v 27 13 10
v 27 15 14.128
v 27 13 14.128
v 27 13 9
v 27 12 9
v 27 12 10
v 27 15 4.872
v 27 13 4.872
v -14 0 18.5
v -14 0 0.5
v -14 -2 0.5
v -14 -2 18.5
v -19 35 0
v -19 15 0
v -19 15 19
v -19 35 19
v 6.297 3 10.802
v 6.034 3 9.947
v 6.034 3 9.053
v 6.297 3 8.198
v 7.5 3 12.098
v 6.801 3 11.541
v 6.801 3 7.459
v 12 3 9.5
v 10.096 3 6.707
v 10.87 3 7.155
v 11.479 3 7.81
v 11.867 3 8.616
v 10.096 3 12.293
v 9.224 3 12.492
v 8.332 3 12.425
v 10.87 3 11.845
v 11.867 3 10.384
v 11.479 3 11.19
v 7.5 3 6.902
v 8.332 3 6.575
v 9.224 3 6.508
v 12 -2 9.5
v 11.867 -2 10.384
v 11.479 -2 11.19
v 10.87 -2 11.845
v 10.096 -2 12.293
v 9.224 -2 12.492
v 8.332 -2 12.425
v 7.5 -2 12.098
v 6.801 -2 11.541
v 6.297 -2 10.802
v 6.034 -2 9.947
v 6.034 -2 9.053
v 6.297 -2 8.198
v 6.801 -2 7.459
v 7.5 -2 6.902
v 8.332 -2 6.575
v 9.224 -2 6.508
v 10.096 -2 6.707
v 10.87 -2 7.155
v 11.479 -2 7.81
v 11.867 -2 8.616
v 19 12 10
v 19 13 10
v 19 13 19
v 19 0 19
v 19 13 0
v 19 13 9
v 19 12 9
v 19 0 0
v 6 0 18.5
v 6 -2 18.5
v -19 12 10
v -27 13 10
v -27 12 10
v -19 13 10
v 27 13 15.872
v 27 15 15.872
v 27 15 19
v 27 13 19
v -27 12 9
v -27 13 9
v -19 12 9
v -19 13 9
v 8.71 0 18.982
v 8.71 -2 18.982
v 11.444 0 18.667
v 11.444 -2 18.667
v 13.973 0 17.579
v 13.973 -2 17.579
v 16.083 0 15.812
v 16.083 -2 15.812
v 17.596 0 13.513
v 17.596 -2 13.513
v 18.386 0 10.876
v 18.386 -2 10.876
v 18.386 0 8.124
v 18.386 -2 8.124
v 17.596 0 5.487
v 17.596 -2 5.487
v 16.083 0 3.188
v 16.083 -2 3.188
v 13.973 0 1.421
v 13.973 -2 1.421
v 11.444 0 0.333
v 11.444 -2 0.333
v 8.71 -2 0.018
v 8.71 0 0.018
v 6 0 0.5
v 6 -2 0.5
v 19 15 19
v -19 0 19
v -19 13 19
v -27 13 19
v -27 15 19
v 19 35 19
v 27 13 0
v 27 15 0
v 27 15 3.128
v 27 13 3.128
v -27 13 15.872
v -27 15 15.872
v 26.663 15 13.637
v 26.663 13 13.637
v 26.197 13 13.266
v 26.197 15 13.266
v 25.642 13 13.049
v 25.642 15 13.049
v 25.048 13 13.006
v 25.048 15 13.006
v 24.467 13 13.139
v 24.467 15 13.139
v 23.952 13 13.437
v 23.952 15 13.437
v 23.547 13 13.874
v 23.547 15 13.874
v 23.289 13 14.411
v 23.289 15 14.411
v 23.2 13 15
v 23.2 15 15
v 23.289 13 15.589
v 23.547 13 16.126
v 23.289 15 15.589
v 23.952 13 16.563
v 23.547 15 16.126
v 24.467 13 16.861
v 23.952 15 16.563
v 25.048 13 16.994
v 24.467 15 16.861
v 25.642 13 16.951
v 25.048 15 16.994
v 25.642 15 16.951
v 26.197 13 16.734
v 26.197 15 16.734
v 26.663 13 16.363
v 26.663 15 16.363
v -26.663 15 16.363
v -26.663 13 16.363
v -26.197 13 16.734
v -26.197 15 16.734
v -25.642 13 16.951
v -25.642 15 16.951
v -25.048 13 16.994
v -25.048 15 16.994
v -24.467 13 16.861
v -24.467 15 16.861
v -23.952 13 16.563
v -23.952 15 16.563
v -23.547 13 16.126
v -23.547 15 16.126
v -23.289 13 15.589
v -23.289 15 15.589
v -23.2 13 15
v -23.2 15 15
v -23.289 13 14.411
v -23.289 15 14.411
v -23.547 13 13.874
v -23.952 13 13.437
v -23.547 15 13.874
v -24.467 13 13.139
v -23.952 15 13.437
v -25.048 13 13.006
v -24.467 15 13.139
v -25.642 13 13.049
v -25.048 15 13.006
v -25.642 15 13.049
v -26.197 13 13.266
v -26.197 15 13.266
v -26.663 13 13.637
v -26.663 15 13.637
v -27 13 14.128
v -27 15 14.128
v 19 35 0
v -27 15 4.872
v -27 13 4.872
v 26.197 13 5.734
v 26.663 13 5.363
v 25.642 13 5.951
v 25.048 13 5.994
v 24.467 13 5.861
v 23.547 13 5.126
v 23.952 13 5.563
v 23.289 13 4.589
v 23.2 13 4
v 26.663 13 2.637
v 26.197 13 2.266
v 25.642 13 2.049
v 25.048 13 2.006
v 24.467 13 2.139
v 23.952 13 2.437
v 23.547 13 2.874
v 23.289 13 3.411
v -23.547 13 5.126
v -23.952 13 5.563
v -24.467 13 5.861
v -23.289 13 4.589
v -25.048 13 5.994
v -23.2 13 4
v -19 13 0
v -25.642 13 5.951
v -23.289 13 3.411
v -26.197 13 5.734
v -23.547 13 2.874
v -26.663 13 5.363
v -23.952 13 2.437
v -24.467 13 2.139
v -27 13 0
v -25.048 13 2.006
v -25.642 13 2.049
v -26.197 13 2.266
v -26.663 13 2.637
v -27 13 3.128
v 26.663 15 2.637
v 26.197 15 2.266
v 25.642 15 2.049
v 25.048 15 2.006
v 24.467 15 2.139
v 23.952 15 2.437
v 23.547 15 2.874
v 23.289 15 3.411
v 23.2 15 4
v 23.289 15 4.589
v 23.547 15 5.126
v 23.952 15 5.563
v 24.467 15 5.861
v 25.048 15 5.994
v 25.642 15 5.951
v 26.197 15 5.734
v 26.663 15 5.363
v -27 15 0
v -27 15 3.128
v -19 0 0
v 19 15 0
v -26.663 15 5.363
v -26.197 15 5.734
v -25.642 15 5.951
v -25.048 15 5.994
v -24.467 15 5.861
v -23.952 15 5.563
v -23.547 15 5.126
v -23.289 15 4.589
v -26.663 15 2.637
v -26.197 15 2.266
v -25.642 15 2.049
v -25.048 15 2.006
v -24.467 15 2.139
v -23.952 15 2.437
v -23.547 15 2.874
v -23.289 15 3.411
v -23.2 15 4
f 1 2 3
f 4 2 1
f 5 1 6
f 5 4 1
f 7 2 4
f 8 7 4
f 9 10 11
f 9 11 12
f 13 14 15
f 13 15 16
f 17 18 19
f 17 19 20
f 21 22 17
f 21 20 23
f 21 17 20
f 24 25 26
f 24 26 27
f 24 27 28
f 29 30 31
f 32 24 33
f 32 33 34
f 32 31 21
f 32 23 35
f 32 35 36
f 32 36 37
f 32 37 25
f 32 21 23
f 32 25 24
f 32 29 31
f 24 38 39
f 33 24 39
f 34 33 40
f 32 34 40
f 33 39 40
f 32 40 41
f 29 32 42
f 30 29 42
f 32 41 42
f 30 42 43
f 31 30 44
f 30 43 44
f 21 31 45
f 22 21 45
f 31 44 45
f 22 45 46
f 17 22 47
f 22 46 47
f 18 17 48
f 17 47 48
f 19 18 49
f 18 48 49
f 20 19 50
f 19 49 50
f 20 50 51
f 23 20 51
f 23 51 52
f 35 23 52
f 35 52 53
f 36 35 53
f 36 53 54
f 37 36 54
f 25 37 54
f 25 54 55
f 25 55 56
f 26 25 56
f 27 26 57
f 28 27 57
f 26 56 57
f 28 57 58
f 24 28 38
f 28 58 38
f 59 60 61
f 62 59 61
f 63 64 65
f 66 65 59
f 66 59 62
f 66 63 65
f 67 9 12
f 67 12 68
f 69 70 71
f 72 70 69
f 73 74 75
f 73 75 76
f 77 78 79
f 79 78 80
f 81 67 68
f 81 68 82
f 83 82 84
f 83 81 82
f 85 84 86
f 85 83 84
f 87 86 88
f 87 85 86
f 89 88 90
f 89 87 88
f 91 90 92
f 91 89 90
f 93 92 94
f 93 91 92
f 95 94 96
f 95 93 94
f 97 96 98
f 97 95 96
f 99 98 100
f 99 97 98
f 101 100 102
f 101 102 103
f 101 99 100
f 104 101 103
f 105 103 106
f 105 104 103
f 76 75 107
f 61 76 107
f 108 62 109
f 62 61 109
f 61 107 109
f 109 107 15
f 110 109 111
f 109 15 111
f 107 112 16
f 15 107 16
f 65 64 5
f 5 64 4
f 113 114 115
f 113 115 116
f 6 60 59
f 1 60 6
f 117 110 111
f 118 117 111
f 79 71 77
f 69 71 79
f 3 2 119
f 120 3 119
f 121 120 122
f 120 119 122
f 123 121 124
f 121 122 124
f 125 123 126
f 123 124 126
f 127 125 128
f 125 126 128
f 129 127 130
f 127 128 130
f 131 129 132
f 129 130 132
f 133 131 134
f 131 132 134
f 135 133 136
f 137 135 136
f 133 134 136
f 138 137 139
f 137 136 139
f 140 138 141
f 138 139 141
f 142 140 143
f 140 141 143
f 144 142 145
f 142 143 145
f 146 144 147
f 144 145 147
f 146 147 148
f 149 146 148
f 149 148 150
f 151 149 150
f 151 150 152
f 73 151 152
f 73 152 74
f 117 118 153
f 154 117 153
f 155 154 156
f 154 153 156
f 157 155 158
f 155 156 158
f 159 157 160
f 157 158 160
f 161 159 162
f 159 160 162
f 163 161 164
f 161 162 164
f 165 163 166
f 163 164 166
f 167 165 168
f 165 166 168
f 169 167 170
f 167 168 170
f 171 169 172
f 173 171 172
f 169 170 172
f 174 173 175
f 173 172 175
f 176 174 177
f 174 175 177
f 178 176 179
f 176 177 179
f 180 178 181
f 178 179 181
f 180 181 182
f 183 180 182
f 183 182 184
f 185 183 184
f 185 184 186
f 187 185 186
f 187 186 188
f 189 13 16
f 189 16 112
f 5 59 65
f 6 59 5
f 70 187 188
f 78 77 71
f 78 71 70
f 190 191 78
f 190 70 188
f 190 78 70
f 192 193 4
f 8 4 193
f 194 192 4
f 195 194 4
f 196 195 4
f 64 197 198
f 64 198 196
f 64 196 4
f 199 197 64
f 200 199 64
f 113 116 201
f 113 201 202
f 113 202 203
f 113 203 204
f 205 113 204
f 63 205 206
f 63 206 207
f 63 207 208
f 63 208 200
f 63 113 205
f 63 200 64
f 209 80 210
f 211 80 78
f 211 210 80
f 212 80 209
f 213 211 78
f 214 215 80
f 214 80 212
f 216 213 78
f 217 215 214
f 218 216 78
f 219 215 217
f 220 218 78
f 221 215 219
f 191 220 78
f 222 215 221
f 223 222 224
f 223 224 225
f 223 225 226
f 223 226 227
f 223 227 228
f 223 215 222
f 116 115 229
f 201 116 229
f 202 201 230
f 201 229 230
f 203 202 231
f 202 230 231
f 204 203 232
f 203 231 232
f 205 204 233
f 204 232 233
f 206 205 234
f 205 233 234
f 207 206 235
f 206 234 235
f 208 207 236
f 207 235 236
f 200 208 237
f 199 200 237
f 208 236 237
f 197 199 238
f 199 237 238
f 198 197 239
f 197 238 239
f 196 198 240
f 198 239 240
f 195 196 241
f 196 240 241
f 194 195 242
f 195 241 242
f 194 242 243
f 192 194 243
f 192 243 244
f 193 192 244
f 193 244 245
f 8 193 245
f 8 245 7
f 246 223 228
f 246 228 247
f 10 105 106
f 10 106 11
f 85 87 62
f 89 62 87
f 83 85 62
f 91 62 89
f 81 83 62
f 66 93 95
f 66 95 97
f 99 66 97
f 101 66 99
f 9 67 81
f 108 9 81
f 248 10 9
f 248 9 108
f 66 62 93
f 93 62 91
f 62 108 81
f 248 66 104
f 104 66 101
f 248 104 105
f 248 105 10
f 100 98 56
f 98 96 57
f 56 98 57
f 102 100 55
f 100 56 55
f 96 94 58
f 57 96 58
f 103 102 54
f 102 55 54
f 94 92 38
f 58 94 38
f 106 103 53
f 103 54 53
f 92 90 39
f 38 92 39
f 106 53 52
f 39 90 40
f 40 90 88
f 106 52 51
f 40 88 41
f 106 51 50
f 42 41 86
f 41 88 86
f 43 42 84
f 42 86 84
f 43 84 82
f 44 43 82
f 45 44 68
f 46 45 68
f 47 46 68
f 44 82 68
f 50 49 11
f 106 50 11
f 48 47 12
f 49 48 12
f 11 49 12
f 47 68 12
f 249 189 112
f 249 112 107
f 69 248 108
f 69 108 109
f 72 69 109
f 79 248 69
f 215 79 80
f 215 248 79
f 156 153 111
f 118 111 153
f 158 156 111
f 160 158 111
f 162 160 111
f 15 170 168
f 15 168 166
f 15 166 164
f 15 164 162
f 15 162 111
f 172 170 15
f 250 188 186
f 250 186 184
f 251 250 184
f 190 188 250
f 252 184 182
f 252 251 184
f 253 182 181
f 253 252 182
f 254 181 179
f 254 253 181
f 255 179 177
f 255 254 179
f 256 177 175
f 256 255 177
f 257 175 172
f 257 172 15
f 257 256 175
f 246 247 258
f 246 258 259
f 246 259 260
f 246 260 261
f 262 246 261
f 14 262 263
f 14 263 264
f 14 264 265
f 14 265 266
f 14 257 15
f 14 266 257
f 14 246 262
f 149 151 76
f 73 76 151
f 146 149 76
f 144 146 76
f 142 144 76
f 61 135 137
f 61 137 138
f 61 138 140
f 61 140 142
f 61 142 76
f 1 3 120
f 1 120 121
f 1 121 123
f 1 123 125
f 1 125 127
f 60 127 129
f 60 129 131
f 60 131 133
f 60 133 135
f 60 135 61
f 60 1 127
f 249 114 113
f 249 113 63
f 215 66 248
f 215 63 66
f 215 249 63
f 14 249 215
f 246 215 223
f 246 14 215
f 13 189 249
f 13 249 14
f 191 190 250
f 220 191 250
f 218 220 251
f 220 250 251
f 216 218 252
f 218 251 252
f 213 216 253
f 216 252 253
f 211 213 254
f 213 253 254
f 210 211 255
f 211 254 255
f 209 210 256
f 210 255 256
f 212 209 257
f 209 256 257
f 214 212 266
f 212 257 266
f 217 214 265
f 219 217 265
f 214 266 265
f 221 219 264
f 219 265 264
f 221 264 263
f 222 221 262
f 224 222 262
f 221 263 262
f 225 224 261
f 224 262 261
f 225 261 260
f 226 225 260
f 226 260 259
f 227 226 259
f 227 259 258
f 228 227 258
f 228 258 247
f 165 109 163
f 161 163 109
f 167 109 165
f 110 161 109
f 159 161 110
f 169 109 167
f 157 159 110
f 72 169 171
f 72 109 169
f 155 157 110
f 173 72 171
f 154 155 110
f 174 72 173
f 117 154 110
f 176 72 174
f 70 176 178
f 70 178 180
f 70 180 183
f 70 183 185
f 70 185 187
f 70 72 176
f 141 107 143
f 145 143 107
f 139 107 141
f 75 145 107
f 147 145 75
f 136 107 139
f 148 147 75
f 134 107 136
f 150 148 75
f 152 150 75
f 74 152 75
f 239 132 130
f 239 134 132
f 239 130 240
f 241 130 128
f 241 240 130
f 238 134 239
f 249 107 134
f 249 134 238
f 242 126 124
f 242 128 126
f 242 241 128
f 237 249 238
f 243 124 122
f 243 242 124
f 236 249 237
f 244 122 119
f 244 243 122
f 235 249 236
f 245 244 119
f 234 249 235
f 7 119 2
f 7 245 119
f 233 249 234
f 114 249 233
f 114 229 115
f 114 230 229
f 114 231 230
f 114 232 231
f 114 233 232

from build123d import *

# Parameters (mm, degrees)
BOSS_EXTRUDE1_DEPTH  = 19
SKETCH6_R            = 2
CUT_EXTRUDE2_DEPTH   = 16
SKETCH10_W           = 8
SKETCH10_H           = 1
BOSS_EXTRUDE14_DEPTH = 1
BOSS_EXTRUDE15_DEPTH = 2
SKETCH13_R           = 3
CUT_EXTRUDE3_DEPTH   = 5


with BuildPart() as part:
    # Sketch1 → Boss-Extrude1 (new body)
    with BuildSketch(Plane.XY):
        Polygon((19, 0), (-19, 0), (-19, 13), (-27, 13), (-27, 15), (-19, 15), (-19, 35), (19, 35), (19, 15), (27, 15), (27, 13), (19, 13), align=None)
    extrude(amount=BOSS_EXTRUDE1_DEPTH)

    # Sketch6 → Cut-Extrude2 (cut, through all)
    with BuildSketch(Plane(origin=(0, 15, 0), x_dir=(1, 0, 0), z_dir=(0, 1, 0))):
        with Locations((25.2, -15)):
            Circle(SKETCH6_R)
        with Locations((25.2, -4)):
            Circle(SKETCH6_R)
        with Locations((-25.2, -4)):
            Circle(SKETCH6_R)
        with Locations((-25.2, -15)):
            Circle(SKETCH6_R)
    extrude(amount=-CUT_EXTRUDE2_DEPTH, mode=Mode.SUBTRACT)

    # Sketch10 → Boss-Extrude14 (add)
    with BuildSketch(Plane.XZ.offset(-13)):
        with Locations((-23, 9.5)):
            Rectangle(SKETCH10_W, SKETCH10_H)
        with Locations((23, 9.5)):
            Rectangle(SKETCH10_W, SKETCH10_H)
    extrude(amount=BOSS_EXTRUDE14_DEPTH)

    # Sketch12 → Boss-Extrude15 (add)
    with BuildSketch(Plane.XZ):
        with BuildLine():
            Line((-14, 18.5), (6, 18.5))
            ThreePointArc((6, 18.5), (18.486832981, 9.5), (6, 0.5))
            Line((6, 0.5), (-14, 0.5))
            Line((-14, 0.5), (-14, 18.5))
        make_face()
    extrude(amount=BOSS_EXTRUDE15_DEPTH)

    # Sketch13 → Cut-Extrude3 (cut)
    with BuildSketch(Plane.XZ.offset(2)):
        with Locations((9, 9.5)):
            Circle(SKETCH13_R)
    extrude(amount=-CUT_EXTRUDE3_DEPTH, mode=Mode.SUBTRACT)


solid = part.part
